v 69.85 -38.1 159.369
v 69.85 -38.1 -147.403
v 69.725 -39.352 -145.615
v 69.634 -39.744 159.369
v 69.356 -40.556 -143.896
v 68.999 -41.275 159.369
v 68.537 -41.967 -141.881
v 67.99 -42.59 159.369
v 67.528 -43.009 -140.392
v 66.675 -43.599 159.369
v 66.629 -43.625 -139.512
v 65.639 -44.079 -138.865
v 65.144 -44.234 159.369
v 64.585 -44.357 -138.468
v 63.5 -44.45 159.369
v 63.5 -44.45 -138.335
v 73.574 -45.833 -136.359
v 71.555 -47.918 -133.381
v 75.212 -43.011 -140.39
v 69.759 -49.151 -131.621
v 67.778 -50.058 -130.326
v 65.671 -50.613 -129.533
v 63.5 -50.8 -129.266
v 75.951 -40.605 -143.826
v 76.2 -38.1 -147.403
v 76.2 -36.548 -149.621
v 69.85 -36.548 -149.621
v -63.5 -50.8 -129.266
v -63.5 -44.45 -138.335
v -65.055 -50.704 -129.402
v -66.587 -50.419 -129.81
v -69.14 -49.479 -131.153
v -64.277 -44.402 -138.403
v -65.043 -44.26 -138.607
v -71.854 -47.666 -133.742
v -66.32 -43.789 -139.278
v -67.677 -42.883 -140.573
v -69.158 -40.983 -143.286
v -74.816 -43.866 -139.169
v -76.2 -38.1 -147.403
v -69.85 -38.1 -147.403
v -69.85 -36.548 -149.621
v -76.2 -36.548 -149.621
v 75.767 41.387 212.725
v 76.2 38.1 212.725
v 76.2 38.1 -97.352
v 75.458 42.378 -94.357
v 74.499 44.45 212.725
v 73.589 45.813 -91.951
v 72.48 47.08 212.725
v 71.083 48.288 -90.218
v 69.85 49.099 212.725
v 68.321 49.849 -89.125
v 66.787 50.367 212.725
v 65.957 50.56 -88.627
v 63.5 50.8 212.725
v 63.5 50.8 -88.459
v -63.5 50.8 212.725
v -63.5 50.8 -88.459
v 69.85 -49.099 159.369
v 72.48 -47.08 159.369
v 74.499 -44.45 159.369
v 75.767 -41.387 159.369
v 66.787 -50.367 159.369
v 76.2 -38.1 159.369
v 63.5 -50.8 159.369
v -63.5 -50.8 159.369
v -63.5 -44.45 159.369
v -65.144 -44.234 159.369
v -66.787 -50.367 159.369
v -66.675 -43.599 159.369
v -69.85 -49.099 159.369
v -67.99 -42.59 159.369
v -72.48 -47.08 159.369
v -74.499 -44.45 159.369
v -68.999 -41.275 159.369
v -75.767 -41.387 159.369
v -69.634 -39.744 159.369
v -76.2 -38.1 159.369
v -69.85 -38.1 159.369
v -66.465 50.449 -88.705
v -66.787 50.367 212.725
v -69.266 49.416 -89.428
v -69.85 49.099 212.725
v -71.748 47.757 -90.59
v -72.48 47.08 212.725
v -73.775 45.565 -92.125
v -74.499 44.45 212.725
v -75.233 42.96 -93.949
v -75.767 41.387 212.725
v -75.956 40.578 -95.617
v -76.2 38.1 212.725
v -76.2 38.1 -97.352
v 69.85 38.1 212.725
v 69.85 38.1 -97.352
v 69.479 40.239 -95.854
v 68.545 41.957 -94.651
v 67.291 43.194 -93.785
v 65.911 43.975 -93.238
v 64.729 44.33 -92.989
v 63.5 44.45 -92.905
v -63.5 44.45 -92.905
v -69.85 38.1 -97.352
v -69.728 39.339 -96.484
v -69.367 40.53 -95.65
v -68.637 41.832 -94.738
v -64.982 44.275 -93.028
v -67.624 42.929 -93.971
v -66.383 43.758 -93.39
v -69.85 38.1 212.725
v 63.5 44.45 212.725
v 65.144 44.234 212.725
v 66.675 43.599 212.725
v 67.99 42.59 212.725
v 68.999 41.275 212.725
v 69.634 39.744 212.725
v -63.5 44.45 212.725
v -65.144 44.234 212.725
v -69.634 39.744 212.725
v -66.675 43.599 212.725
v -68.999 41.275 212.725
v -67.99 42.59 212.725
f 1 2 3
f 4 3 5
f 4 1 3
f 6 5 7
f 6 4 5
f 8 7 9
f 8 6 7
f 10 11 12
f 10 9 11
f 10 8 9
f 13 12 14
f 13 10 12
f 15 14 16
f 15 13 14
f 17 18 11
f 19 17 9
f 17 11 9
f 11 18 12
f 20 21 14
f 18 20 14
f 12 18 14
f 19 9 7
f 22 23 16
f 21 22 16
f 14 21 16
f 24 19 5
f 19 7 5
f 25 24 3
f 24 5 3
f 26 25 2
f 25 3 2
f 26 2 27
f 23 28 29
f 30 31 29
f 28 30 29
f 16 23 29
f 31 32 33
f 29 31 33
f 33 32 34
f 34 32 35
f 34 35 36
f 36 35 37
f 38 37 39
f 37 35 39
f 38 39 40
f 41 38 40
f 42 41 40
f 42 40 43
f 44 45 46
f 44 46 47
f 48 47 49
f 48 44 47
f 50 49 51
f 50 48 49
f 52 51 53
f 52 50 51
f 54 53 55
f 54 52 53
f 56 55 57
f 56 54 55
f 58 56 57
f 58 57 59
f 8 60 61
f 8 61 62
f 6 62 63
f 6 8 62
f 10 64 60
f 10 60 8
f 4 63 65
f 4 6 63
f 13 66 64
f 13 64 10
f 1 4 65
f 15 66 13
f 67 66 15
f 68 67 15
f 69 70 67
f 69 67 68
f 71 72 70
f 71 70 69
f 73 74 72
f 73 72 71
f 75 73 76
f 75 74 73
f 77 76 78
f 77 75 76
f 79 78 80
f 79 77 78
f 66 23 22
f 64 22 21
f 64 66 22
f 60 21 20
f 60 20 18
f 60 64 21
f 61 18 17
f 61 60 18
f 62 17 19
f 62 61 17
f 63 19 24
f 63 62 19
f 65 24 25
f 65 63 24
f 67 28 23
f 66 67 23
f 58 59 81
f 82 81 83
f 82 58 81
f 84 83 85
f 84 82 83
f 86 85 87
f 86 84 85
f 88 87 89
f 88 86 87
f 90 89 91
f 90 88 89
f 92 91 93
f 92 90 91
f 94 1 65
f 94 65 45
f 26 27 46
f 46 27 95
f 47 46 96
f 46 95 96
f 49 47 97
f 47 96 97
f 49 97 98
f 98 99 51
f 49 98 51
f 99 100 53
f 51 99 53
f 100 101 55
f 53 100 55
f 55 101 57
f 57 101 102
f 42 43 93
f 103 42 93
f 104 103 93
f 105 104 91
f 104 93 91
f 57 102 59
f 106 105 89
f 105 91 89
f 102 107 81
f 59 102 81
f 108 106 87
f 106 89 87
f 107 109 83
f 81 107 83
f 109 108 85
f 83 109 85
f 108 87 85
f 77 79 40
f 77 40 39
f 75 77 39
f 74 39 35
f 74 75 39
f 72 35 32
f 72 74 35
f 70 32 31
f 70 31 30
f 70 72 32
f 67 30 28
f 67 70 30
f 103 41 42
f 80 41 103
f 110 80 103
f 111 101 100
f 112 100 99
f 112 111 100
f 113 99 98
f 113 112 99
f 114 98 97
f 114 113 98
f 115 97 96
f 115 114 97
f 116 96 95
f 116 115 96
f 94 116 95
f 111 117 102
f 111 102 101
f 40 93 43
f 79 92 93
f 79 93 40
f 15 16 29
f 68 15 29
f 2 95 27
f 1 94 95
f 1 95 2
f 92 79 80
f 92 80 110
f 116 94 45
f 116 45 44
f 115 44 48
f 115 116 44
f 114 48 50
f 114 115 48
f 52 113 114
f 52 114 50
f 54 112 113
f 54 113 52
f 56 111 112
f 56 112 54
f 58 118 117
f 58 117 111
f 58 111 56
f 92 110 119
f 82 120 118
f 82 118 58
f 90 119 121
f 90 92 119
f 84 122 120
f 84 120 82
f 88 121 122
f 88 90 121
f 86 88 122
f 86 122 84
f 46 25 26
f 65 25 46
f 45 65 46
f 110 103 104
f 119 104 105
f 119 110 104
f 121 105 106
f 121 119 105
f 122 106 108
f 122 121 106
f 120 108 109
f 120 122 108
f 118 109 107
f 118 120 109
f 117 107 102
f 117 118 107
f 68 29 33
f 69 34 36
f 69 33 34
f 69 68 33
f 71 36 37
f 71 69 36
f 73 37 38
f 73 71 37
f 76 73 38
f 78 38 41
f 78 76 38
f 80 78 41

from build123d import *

# Parameters (mm, degrees)
BOSS_EXTRUDE1_DEPTH     = 215.9
CUT_EXTRUDE1_DEPTH      = 235.52055347
CUT_EXTRUDE1_DEPTH_BACK = 235.52055347
CUT_EXTRUDE2_DEPTH      = 235.52055347
CUT_EXTRUDE2_DEPTH_BACK = 235.52055347
CUT_EXTRUDE3_DEPTH      = 267.567675507
CUT_EXTRUDE3_DEPTH_BACK = 267.567675507


with BuildPart() as part:
    # Sketch1 → Boss-Extrude1 (new, symmetric)
    with BuildSketch(Plane.XY):
        with BuildLine():
            Line((-63.5, -50.8), (63.5, -50.8))
            ThreePointArc((63.5, -50.8), (72.480256121, -47.080256121), (76.2, -38.1))
            Line((76.2, -38.1), (76.2, 38.1))
            ThreePointArc((76.2, 38.1), (72.480256121, 47.080256121), (63.5, 50.8))
            Line((63.5, 50.8), (-63.5, 50.8))
            ThreePointArc((-63.5, 50.8), (-72.480256121, 47.080256121), (-76.2, 38.1))
            Line((-76.2, 38.1), (-76.2, -38.1))
            ThreePointArc((-76.2, -38.1), (-72.480256121, -47.080256121), (-63.5, -50.8))
        make_face()
        with BuildLine():
            Line((-63.5, 44.45), (63.5, 44.45))
            ThreePointArc((63.5, 44.45), (67.990128061, 42.590128061), (69.85, 38.1))
            Line((69.85, 38.1), (69.85, -38.1))
            ThreePointArc((69.85, -38.1), (67.990128061, -42.590128061), (63.5, -44.45))
            Line((63.5, -44.45), (-63.5, -44.45))
            ThreePointArc((-63.5, -44.45), (-67.990128061, -42.590128061), (-69.85, -38.1))
            Line((-69.85, -38.1), (-69.85, 38.1))
            ThreePointArc((-69.85, 38.1), (-67.990128061, 42.590128061), (-63.5, 44.45))
        make_face(mode=Mode.SUBTRACT)
    extrude(amount=BOSS_EXTRUDE1_DEPTH, both=True)

    # Sketch2 → Cut-Extrude1 (cut, two sides: drawn at the far end of the back side and taken through both)
    with BuildSketch(Plane(origin=(0, 0, 0), x_dir=(0, 0, -1), z_dir=(1, 0, 0)).offset(-CUT_EXTRUDE1_DEPTH_BACK)):
        Polygon((-215.9, 50.8), (-215.9, -50.8), (-159.369185588, -50.8), (-159.369185588, -38.1), (-212.725, 38.1), (-212.725, 50.8), align=None)
    extrude(amount=CUT_EXTRUDE1_DEPTH + CUT_EXTRUDE1_DEPTH_BACK, mode=Mode.SUBTRACT)

    # Sketch3 → Cut-Extrude2 (cut, two sides: drawn at the far end of the back side and taken through both)
    with BuildSketch(Plane(origin=(0, 0, 0), x_dir=(0, 0, -1), z_dir=(1, 0, 0)).offset(-CUT_EXTRUDE2_DEPTH_BACK)):
        Polygon((70.328712905, 76.692890201), (278.875695835, 76.692890201), (278.875695835, -66.353510659), (183.855194167, -85.439727725), align=None)
    extrude(amount=CUT_EXTRUDE2_DEPTH + CUT_EXTRUDE2_DEPTH_BACK, mode=Mode.SUBTRACT)

    # Sketch4 → Cut-Extrude3 (cut, two sides: drawn at the far end of the back side and taken through both)
    with BuildSketch(Plane(origin=(76.2, 0, 0), x_dir=(0, 0, -1), z_dir=(1, 0, 0)).offset(-CUT_EXTRUDE3_DEPTH_BACK)):
        Polygon((51.667098459, -105.135311235), (172.443519022, -20.566751119), (188.243794301, -73.434684409), align=None)
    extrude(amount=CUT_EXTRUDE3_DEPTH + CUT_EXTRUDE3_DEPTH_BACK, mode=Mode.SUBTRACT)


solid = part.part
